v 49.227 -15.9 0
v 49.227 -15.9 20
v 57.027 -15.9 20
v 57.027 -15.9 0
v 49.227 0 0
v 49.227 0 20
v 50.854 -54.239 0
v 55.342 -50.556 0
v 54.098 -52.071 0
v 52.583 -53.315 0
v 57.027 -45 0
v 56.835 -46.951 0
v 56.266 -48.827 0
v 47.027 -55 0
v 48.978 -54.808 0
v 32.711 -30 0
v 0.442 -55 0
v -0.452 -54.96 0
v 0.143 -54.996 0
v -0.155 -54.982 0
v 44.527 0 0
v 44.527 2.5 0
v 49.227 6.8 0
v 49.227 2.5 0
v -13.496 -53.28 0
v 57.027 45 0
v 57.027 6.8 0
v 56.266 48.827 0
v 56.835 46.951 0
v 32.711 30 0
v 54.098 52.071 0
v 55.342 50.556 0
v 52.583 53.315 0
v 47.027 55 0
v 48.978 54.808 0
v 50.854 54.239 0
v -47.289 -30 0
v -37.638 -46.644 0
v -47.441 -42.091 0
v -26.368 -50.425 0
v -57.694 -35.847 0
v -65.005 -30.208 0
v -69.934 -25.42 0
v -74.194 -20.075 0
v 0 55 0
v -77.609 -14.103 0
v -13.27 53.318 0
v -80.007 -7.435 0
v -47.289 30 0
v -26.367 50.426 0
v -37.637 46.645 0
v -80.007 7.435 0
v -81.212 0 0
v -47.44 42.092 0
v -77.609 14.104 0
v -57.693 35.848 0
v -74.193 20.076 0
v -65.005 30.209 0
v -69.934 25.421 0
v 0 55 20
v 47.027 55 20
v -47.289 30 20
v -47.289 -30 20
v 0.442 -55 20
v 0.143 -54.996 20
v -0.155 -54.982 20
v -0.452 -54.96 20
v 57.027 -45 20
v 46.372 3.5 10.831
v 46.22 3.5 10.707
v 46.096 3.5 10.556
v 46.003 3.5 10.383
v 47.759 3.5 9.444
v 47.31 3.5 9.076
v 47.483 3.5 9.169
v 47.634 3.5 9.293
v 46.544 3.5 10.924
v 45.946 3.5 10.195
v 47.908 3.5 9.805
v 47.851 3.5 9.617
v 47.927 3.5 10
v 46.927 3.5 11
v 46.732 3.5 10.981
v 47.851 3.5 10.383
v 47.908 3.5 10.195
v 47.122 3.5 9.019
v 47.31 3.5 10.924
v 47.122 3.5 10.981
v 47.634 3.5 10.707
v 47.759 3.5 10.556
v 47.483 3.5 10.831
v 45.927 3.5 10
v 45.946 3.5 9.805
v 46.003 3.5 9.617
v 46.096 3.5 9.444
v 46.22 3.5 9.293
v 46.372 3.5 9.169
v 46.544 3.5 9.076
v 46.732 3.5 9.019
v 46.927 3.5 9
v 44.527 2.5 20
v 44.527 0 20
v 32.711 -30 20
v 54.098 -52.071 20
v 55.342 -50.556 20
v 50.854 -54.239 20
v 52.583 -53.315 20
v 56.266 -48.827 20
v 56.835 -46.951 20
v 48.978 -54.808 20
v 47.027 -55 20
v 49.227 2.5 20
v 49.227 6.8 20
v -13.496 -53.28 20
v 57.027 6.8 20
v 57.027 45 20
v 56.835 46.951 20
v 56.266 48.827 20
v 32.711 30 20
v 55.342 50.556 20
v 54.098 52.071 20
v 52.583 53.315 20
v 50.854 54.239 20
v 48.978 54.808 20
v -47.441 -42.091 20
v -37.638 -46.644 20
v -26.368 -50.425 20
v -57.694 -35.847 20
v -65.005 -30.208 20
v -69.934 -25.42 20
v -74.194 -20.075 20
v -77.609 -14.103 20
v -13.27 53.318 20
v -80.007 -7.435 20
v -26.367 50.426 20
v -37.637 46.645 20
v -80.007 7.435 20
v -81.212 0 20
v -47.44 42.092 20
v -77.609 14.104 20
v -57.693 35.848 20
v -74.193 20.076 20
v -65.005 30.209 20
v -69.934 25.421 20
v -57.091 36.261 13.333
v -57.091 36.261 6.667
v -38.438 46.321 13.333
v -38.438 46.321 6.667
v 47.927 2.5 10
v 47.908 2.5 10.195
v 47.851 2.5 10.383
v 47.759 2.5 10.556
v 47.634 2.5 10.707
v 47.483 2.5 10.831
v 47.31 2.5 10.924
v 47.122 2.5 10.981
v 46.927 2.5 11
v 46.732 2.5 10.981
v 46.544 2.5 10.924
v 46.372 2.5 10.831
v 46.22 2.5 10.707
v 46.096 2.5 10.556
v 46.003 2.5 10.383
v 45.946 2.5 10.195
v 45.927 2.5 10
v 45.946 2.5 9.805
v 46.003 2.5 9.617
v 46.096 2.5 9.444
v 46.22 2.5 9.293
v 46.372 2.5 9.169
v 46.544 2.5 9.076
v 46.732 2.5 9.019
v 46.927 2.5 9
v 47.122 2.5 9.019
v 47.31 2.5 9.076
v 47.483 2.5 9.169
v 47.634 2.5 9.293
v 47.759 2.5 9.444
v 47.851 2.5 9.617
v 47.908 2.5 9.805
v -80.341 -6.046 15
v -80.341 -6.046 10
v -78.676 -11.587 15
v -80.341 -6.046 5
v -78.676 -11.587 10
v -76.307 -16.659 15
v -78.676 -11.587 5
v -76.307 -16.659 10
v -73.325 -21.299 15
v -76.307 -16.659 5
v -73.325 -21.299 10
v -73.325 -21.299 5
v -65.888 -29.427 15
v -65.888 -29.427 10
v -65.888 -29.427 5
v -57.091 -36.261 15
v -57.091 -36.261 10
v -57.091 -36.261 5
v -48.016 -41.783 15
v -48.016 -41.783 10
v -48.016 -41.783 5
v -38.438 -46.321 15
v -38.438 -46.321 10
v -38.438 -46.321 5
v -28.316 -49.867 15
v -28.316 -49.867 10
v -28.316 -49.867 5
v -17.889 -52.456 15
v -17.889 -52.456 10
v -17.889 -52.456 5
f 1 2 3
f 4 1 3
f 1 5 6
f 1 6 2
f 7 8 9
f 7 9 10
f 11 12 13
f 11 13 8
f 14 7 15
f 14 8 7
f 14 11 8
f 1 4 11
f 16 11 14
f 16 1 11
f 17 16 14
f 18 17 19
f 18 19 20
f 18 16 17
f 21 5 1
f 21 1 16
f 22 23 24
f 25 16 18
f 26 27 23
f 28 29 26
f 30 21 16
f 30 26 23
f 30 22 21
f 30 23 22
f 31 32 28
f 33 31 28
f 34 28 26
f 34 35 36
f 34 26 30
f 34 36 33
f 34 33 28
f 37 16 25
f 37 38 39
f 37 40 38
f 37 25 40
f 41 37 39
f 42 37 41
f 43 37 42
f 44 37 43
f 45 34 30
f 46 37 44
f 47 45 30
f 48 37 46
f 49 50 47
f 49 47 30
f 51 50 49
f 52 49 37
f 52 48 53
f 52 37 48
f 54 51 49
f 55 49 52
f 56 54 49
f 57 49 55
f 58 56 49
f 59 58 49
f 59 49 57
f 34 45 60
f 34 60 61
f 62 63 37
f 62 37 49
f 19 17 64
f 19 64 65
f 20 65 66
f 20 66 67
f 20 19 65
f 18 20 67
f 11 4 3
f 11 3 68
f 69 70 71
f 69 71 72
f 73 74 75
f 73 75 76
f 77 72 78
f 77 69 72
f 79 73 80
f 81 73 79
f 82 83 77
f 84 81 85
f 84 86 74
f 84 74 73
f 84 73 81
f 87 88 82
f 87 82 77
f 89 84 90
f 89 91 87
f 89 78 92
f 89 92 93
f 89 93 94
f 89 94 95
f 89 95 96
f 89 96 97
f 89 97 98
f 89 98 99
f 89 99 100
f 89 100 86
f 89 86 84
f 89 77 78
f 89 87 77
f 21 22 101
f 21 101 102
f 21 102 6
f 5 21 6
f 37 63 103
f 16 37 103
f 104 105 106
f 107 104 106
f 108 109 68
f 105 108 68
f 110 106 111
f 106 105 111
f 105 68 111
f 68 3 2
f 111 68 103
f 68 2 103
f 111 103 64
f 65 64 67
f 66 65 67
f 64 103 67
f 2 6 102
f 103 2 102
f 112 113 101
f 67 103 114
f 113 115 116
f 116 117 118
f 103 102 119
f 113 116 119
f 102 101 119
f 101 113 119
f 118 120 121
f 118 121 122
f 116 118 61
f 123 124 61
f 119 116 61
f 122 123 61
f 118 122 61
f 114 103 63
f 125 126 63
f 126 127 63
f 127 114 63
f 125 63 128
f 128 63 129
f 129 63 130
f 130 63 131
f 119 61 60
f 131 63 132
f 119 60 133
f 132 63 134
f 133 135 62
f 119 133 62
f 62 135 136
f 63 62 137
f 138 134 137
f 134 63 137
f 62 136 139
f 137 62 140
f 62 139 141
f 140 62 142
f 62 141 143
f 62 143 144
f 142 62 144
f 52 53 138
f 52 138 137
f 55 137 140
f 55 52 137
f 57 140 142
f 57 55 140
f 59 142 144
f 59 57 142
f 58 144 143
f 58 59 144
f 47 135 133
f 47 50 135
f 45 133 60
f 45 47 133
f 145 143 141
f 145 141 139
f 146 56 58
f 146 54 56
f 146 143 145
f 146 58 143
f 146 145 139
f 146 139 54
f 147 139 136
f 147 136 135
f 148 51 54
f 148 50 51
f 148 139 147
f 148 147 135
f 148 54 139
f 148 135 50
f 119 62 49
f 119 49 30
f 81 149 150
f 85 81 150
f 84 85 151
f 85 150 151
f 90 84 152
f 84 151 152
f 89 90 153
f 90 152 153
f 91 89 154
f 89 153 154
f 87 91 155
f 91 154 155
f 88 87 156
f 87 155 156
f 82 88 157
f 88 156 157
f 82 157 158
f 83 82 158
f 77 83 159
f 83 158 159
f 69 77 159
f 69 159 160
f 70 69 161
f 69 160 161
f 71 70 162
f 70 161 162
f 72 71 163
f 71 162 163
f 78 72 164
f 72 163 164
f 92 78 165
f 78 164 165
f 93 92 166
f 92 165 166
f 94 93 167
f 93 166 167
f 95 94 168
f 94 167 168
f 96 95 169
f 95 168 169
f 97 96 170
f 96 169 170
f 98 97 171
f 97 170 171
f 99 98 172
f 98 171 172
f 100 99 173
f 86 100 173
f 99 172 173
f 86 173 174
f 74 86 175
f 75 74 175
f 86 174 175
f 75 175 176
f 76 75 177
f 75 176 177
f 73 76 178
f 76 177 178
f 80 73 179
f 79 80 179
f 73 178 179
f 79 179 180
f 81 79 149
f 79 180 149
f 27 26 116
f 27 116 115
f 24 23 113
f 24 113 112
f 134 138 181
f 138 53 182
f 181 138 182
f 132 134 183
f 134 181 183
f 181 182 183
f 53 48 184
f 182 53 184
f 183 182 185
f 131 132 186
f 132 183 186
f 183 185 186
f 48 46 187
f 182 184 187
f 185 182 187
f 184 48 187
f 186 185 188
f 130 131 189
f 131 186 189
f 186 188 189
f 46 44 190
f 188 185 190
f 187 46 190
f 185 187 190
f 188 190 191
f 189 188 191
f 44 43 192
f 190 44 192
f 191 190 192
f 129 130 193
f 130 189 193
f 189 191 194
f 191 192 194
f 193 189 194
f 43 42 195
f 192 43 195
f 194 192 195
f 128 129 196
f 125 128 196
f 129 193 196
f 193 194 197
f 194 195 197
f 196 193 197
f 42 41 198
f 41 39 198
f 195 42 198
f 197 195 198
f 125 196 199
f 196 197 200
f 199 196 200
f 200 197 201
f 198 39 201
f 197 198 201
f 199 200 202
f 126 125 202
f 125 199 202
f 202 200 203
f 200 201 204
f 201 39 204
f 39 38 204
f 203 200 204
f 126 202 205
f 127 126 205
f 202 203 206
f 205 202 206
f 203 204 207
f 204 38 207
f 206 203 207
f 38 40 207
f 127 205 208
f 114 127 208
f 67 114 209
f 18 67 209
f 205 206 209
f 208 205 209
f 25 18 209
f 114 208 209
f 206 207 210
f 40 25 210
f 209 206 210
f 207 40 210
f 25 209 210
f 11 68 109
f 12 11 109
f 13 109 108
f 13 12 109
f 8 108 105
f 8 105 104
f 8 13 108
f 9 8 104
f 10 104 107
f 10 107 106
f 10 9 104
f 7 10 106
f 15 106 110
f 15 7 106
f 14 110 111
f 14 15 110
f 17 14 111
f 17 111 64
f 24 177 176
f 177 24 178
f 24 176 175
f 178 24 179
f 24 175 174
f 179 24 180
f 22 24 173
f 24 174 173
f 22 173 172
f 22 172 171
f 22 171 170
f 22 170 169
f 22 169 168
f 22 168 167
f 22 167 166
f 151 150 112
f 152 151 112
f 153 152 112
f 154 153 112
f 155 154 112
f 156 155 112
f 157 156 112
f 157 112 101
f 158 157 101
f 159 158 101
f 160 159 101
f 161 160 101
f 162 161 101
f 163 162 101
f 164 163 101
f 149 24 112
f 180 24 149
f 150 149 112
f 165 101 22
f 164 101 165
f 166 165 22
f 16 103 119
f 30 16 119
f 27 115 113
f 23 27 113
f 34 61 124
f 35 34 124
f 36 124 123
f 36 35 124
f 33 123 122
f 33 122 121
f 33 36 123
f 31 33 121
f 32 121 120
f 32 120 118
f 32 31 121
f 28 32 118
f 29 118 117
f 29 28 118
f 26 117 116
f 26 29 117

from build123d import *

# Parameters (mm, degrees)
BOSS_EXTRUDE1_DEPTH = 20
SKETCH2_W           = 80
SKETCH2_H           = 60
CUT_EXTRUDE1_DEPTH  = 20
CUT_EXTRUDE2_DEPTH  = 20
SKETCH5_R           = 1
CUT_EXTRUDE4_DEPTH  = 1


with BuildPart() as part:
    # Sketch1 → Boss-Extrude1 (new body)
    with BuildSketch(Plane.XY):
        with BuildLine():
            Line((0, 55), (47.027150271, 55))
            ThreePointArc((47.027150271, 55), (54.098218083, 52.071067812), (57.027150271, 45))
            Line((57.027150271, 45), (57.027150271, -45))
            ThreePointArc((57.027150271, -45), (54.098218083, -52.071067812), (47.027150271, -55))
            Line((47.027150271, -55), (0.441720212, -55))
            ThreePointArc((0.441720212, -55), (-0.005784399, -54.989981963), (-0.452392388, -54.959947924))
            add(Edge.make_bspline(
                [(-81.211824921, 0), (-80.030487626, -16.829502098), (-64.338425338, -33.147030622), (-38.651767748, -47.067005008), (-19.235585963, -52.655551102), (-6.275521273, -54.437200923), (-0.452392388, -54.959947924)],
                knots=[0, 0, 0, 0, 0.422832961, 0.624311743, 0.828189209, 0.995662594, 0.995662594, 0.995662594, 0.995662594], degree=3))
            add(Edge.make_bspline(
                [(-81.211824921, 0), (-80.03021452, 16.829535827), (-64.338739167, 33.146991864), (-33.323213758, 49.95438824), (-13.059438762, 53.859901845), (0, 55)],
                knots=[0, 0, 0, 0, 0.422843906, 0.624327904, 1, 1, 1, 1], degree=3))
        make_face()
    extrude(amount=BOSS_EXTRUDE1_DEPTH)

    # Sketch2 → Cut-Extrude1 (cut)
    with BuildSketch(Plane.XY.offset(20)):
        with Locations((-7.289359696, 0)):
            Rectangle(SKETCH2_W, SKETCH2_H)
    extrude(amount=-CUT_EXTRUDE1_DEPTH, mode=Mode.SUBTRACT)

    # Sketch3 → Cut-Extrude2 (cut)
    with BuildSketch(Plane.XY.offset(20)):
        Polygon((57.027150271, 6.8), (49.227150271, 6.8), (49.227150271, 2.5), (44.527150271, 2.5), (44.527150271, 0), (49.227150271, 0), (49.227150271, -15.9), (57.027150271, -15.9), align=None)
    extrude(amount=-CUT_EXTRUDE2_DEPTH, mode=Mode.SUBTRACT)

    # Sketch5 → Cut-Extrude4 (cut)
    with BuildSketch(Plane.XZ.offset(-2.5)):
        with Locations((46.927150271, 10)):
            Circle(SKETCH5_R)
    extrude(amount=-CUT_EXTRUDE4_DEPTH, mode=Mode.SUBTRACT)


solid = part.part
